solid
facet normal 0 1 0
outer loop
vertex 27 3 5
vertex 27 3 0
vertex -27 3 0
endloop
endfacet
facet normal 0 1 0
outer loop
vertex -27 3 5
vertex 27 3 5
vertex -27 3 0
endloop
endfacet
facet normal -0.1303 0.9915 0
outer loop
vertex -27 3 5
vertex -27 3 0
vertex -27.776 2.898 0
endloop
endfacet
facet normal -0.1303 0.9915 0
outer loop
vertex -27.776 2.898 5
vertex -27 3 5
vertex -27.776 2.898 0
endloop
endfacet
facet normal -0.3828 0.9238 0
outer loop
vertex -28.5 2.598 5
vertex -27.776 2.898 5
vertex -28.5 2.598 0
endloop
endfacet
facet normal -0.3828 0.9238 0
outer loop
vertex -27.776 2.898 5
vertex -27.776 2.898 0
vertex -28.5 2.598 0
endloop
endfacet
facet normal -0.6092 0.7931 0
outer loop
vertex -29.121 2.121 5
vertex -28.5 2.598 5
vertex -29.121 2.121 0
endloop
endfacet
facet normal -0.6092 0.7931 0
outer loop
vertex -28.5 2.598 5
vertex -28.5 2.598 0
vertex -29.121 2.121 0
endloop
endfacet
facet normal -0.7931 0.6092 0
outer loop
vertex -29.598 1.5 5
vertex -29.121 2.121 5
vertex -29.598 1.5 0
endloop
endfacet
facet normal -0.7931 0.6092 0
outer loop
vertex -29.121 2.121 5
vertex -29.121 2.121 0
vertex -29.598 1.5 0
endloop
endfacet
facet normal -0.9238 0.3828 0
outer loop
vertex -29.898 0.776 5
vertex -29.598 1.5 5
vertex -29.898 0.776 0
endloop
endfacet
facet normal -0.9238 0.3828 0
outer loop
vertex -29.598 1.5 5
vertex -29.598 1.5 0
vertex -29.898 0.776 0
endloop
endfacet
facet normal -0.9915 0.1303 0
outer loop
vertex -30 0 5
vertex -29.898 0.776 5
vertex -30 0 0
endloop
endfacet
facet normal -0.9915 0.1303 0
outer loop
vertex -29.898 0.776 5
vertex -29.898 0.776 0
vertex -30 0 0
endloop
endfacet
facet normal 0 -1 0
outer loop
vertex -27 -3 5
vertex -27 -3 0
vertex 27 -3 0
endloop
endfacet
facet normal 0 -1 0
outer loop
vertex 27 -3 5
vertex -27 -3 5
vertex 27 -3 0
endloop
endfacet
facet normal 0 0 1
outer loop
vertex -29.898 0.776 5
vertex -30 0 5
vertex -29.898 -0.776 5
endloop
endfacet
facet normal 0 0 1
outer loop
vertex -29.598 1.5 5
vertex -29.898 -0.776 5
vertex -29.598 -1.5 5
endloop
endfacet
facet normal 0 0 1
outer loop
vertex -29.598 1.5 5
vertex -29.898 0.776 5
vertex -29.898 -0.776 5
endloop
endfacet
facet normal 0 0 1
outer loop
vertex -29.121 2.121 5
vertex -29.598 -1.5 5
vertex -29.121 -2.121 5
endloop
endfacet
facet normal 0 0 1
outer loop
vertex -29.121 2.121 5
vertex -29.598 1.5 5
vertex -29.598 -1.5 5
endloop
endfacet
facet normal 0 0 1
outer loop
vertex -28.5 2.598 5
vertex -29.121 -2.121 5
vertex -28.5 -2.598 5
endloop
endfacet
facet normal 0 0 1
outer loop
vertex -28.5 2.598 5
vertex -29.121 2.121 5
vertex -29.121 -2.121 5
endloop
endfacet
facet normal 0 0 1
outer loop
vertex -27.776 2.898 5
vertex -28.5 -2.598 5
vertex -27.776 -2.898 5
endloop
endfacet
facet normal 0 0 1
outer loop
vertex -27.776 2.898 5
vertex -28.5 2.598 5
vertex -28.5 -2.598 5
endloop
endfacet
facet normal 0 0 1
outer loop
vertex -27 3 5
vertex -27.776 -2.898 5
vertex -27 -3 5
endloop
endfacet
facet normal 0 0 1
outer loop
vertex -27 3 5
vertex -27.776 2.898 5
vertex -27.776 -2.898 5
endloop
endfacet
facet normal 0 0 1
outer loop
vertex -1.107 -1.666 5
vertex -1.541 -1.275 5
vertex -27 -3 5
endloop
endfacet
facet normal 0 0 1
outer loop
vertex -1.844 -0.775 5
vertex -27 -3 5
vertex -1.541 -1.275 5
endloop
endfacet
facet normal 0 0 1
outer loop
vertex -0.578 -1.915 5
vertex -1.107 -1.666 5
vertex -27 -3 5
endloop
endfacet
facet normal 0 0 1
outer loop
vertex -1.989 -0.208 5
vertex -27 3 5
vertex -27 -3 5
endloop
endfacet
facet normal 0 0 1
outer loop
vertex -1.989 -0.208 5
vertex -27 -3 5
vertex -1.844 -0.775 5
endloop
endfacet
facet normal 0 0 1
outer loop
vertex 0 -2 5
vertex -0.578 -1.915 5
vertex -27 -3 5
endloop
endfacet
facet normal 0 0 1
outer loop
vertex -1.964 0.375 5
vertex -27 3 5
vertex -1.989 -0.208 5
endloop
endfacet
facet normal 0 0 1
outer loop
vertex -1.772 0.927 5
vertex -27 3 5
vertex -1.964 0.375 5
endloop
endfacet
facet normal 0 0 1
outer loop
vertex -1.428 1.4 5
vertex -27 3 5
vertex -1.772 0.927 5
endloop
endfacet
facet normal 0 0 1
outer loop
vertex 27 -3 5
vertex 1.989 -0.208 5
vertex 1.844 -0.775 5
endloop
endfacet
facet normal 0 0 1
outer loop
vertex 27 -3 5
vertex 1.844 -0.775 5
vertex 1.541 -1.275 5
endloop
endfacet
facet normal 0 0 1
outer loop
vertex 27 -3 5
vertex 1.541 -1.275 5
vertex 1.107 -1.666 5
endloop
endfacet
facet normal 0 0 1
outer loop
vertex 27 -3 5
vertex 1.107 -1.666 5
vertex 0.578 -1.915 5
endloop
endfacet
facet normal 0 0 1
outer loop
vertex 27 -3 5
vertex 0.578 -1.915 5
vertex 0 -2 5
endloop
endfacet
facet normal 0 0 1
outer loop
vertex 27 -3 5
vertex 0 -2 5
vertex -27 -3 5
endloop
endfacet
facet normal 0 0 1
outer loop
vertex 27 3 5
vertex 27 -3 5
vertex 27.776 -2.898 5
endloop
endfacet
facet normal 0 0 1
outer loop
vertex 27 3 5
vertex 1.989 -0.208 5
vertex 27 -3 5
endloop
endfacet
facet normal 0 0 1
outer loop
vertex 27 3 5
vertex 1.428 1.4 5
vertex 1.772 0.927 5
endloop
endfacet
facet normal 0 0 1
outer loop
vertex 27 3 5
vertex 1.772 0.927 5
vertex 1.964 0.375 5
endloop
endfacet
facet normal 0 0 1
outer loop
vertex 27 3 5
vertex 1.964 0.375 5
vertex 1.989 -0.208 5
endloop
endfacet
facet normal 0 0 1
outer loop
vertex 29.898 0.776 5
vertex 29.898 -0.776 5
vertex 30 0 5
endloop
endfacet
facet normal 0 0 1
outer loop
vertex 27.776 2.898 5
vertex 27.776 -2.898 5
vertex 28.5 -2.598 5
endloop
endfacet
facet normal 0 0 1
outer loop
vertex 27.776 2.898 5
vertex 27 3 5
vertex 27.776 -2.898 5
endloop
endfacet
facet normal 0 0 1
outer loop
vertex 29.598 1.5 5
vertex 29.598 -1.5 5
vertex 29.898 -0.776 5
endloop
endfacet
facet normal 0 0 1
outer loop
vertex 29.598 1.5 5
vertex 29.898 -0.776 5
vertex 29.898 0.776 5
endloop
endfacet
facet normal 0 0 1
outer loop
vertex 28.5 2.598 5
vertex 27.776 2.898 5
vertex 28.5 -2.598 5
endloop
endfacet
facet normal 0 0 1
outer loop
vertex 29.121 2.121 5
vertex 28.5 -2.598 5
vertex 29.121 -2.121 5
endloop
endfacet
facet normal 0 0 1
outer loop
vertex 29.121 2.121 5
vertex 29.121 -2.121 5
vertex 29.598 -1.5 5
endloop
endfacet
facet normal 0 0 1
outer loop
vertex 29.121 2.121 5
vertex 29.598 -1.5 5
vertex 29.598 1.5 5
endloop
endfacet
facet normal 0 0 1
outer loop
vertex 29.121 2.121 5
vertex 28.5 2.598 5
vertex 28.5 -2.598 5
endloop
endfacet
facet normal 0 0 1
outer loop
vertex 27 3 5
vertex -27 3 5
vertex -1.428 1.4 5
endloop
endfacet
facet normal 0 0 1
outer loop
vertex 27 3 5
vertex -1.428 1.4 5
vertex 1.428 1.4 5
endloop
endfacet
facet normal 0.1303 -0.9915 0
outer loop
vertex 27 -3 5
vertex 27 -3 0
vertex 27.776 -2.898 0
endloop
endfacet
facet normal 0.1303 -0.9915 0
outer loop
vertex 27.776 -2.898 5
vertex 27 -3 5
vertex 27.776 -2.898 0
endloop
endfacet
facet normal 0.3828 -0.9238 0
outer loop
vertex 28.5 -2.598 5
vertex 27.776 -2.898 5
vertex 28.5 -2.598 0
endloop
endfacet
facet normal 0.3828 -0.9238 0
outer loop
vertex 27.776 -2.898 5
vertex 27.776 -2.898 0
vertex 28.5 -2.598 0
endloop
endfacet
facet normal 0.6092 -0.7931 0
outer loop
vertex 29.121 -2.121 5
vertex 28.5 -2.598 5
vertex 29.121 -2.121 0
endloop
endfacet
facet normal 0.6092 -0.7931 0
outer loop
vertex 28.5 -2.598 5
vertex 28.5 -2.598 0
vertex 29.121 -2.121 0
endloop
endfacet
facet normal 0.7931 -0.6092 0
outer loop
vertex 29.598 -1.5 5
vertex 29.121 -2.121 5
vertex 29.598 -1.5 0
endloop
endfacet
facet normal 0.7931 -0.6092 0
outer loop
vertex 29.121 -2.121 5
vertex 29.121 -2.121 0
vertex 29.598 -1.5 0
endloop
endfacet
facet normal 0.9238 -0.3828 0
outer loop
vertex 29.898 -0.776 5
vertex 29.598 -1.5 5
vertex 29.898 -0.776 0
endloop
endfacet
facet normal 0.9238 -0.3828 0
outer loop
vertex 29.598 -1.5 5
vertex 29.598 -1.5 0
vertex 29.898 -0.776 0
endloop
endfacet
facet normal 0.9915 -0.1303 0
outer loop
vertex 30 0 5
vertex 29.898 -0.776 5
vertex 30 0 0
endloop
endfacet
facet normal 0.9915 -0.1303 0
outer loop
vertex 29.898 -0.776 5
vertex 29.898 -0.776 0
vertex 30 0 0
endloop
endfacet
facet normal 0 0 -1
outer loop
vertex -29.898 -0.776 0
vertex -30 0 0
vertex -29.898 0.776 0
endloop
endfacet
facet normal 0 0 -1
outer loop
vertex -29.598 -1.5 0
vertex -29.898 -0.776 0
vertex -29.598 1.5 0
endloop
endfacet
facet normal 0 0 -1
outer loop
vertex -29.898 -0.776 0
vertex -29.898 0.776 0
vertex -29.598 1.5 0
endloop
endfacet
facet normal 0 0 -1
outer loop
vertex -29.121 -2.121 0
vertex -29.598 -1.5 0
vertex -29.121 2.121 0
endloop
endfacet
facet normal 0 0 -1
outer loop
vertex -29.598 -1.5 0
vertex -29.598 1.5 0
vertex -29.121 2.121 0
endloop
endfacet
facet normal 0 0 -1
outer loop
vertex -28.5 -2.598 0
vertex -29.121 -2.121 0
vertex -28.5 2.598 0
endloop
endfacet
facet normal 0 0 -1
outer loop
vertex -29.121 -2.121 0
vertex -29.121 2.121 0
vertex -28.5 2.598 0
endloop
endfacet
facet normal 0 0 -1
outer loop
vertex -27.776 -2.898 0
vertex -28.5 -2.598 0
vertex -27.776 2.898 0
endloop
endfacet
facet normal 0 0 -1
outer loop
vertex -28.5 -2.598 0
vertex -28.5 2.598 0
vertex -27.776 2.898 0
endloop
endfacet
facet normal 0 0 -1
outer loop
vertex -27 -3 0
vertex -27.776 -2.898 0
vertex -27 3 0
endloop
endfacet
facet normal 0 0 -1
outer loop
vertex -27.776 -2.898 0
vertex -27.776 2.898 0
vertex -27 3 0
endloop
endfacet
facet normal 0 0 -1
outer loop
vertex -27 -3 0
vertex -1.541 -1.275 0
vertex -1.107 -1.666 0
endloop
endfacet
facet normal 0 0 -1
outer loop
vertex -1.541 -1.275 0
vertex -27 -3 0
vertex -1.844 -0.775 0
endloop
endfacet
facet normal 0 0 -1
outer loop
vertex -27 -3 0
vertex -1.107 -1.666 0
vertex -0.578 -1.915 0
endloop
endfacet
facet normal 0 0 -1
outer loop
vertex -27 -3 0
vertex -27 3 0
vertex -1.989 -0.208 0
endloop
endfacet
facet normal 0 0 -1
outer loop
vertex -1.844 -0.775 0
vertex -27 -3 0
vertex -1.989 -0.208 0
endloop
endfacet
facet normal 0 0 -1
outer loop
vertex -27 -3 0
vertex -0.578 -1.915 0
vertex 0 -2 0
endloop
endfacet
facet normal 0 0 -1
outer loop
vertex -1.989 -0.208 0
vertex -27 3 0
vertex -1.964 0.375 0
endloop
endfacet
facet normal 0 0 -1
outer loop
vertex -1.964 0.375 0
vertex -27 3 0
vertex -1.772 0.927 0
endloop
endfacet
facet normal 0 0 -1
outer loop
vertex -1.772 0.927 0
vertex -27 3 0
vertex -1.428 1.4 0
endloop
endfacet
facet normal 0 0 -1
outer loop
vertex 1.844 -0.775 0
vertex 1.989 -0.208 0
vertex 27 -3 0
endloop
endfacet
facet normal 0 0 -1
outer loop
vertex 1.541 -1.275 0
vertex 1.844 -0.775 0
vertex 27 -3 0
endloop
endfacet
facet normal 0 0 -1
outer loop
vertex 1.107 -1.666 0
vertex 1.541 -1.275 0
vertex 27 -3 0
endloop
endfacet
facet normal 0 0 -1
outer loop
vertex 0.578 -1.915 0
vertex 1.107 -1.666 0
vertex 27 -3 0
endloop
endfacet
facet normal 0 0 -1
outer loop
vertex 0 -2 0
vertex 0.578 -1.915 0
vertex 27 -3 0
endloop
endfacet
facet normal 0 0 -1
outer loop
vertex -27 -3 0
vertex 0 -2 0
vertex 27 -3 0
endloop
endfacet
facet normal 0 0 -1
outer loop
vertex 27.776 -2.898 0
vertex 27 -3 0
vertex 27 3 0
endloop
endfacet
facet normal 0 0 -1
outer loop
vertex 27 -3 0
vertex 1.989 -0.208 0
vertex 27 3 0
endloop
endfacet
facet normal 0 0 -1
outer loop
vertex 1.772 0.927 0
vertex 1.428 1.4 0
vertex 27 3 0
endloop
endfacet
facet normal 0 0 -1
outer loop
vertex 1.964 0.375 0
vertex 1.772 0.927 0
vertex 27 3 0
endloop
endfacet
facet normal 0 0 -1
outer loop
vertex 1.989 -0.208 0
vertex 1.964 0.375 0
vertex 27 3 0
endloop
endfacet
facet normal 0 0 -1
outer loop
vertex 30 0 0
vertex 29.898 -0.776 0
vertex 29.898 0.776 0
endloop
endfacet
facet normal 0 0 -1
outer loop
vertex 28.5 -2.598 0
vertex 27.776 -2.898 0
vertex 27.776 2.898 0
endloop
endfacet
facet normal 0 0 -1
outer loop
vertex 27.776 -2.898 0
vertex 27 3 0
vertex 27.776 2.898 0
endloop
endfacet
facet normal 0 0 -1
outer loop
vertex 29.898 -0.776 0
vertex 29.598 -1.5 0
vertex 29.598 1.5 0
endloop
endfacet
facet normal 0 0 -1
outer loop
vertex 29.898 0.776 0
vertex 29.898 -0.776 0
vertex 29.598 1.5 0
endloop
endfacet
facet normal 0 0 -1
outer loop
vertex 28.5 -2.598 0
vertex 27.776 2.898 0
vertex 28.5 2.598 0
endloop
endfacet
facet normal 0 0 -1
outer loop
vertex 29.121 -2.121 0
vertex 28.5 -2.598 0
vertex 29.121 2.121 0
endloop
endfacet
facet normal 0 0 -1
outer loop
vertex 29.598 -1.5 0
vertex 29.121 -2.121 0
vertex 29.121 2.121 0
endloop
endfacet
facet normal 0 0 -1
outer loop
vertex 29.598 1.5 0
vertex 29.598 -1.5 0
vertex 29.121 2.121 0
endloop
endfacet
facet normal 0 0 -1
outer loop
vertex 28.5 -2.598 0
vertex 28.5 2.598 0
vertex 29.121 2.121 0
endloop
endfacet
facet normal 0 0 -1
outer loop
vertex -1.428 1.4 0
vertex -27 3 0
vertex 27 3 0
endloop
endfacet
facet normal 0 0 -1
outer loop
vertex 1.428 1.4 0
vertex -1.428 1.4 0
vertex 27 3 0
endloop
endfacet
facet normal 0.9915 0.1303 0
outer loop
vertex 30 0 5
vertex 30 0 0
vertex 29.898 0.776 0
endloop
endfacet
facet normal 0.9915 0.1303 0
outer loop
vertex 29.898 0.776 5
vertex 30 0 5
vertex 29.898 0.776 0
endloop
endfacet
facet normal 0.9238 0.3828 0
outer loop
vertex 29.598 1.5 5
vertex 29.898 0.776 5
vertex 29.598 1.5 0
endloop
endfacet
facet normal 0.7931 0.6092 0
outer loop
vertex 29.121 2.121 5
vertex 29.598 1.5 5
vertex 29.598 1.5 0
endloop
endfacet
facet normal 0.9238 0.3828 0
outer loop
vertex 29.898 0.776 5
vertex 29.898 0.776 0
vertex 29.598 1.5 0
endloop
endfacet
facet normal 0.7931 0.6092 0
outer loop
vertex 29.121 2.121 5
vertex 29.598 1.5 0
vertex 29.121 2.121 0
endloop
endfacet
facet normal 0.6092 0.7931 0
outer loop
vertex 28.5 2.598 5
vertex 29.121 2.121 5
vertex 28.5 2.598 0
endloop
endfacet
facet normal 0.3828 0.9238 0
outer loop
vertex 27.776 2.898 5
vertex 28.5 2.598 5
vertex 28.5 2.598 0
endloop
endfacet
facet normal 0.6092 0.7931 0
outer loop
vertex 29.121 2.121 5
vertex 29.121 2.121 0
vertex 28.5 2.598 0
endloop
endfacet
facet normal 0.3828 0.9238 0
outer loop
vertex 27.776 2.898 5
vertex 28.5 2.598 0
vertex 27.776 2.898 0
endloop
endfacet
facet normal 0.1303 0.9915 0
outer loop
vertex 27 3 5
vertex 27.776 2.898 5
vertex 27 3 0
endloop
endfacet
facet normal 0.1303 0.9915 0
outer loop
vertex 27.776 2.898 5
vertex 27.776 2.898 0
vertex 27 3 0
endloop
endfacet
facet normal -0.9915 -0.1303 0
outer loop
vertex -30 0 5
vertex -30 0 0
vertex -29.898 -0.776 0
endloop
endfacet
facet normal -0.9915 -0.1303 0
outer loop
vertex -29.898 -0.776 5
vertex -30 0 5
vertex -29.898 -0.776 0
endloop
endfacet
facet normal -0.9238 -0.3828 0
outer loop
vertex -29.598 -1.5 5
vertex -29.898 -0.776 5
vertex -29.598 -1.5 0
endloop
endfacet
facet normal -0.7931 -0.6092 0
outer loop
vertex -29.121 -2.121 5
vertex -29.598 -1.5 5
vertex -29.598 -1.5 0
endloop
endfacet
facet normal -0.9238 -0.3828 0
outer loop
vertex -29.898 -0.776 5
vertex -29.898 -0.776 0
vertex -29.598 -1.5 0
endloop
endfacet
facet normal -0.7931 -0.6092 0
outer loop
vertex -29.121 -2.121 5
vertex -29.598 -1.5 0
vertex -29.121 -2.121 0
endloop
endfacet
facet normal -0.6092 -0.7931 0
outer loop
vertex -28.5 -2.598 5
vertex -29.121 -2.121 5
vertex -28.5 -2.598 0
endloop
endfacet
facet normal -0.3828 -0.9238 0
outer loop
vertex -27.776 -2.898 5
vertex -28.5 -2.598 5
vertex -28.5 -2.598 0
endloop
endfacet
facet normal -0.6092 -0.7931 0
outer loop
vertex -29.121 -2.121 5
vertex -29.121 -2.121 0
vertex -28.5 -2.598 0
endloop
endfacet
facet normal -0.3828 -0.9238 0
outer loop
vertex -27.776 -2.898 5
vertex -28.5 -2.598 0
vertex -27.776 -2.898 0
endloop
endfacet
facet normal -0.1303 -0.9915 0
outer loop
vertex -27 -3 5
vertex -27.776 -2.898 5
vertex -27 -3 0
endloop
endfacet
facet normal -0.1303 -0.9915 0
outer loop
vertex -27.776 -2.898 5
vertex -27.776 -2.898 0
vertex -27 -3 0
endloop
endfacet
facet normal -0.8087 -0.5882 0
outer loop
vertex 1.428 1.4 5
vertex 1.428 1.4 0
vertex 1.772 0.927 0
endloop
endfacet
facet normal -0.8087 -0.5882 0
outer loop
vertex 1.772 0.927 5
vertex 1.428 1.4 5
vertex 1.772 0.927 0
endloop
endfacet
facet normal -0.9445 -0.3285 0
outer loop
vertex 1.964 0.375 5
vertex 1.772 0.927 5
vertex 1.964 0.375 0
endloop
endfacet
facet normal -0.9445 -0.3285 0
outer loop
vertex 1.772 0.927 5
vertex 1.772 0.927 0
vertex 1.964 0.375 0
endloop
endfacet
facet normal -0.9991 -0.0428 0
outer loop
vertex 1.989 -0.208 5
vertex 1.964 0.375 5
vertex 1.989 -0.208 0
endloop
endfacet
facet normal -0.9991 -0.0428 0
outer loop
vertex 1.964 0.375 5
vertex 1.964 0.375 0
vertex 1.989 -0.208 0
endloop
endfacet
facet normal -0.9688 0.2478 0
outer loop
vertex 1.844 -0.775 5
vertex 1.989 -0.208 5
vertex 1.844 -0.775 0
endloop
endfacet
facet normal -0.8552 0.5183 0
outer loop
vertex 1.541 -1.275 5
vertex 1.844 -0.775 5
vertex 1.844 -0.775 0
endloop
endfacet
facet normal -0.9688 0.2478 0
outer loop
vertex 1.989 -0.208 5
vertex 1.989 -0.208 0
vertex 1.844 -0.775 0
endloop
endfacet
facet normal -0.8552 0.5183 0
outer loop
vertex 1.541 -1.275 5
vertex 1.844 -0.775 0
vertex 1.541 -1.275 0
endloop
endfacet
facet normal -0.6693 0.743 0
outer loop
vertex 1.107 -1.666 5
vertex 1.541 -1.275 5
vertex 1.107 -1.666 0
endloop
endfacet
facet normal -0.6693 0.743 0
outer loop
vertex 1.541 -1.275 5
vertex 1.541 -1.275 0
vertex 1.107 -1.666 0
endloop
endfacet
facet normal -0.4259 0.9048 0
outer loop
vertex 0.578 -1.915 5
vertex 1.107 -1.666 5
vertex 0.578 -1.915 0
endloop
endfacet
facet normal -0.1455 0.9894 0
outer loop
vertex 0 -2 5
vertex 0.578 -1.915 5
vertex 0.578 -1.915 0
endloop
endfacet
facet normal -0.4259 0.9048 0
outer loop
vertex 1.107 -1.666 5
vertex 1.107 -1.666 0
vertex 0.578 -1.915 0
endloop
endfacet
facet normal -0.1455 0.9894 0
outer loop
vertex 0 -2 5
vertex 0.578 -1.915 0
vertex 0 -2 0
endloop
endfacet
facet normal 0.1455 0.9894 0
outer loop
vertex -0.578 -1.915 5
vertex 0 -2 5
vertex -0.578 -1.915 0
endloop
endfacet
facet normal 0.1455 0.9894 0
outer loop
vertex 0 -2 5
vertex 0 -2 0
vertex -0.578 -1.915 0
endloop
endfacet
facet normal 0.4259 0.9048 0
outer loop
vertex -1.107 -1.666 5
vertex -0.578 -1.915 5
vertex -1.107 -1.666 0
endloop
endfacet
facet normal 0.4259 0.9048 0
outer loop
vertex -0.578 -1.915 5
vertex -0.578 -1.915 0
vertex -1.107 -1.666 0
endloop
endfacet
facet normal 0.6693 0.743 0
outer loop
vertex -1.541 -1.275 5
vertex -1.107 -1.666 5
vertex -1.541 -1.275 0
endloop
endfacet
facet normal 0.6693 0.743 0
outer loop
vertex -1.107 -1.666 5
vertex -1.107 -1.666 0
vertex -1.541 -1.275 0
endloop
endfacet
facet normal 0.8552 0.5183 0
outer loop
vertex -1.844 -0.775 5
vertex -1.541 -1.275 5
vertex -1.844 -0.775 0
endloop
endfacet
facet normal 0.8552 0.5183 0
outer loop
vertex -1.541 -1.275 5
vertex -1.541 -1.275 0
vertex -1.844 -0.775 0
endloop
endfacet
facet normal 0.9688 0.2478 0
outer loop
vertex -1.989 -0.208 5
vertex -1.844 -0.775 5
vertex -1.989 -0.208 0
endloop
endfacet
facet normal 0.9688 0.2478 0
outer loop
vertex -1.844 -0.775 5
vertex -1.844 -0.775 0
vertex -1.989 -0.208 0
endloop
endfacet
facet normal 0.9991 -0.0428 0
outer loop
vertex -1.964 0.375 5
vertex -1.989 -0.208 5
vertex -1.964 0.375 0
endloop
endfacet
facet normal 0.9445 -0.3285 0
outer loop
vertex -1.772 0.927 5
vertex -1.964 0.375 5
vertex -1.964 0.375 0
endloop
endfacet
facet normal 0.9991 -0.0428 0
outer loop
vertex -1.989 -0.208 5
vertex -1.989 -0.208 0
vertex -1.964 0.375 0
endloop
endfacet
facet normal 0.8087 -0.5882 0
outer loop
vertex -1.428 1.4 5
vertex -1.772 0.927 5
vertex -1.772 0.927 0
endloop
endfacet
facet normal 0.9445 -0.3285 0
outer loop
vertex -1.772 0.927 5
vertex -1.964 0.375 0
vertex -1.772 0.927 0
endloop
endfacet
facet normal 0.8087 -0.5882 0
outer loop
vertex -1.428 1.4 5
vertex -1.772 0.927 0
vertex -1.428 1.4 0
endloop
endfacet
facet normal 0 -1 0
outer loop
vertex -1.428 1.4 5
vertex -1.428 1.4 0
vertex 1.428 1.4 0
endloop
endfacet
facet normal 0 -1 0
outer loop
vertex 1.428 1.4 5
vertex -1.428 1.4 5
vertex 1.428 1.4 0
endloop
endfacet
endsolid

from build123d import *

# Parameters (mm, degrees)
F1_DEPTH = 5


with BuildPart() as f1:
    # F0 (on Top) → F1 (new body)
    with BuildSketch(Plane.XY):
        with BuildLine():
            Line((-27, -3), (27, -3))
            ThreePointArc((27, -3), (29.12132, -2.12132), (30, 0))
            ThreePointArc((30, 0), (29.12132, 2.12132), (27, 3))
            Line((27, 3), (-27, 3))
            ThreePointArc((-27, 3), (-29.12132, 2.12132), (-30, 0))
            ThreePointArc((-30, 0), (-29.12132, -2.12132), (-27, -3))
        make_face()
        with BuildLine():
            ThreePointArc((1.428286, 1.4), (0, -2), (-1.428286, 1.4))
            Line((-1.428286, 1.4), (1.428286, 1.4))
        make_face(mode=Mode.SUBTRACT)
    extrude(amount=F1_DEPTH)


solid = f1.part
